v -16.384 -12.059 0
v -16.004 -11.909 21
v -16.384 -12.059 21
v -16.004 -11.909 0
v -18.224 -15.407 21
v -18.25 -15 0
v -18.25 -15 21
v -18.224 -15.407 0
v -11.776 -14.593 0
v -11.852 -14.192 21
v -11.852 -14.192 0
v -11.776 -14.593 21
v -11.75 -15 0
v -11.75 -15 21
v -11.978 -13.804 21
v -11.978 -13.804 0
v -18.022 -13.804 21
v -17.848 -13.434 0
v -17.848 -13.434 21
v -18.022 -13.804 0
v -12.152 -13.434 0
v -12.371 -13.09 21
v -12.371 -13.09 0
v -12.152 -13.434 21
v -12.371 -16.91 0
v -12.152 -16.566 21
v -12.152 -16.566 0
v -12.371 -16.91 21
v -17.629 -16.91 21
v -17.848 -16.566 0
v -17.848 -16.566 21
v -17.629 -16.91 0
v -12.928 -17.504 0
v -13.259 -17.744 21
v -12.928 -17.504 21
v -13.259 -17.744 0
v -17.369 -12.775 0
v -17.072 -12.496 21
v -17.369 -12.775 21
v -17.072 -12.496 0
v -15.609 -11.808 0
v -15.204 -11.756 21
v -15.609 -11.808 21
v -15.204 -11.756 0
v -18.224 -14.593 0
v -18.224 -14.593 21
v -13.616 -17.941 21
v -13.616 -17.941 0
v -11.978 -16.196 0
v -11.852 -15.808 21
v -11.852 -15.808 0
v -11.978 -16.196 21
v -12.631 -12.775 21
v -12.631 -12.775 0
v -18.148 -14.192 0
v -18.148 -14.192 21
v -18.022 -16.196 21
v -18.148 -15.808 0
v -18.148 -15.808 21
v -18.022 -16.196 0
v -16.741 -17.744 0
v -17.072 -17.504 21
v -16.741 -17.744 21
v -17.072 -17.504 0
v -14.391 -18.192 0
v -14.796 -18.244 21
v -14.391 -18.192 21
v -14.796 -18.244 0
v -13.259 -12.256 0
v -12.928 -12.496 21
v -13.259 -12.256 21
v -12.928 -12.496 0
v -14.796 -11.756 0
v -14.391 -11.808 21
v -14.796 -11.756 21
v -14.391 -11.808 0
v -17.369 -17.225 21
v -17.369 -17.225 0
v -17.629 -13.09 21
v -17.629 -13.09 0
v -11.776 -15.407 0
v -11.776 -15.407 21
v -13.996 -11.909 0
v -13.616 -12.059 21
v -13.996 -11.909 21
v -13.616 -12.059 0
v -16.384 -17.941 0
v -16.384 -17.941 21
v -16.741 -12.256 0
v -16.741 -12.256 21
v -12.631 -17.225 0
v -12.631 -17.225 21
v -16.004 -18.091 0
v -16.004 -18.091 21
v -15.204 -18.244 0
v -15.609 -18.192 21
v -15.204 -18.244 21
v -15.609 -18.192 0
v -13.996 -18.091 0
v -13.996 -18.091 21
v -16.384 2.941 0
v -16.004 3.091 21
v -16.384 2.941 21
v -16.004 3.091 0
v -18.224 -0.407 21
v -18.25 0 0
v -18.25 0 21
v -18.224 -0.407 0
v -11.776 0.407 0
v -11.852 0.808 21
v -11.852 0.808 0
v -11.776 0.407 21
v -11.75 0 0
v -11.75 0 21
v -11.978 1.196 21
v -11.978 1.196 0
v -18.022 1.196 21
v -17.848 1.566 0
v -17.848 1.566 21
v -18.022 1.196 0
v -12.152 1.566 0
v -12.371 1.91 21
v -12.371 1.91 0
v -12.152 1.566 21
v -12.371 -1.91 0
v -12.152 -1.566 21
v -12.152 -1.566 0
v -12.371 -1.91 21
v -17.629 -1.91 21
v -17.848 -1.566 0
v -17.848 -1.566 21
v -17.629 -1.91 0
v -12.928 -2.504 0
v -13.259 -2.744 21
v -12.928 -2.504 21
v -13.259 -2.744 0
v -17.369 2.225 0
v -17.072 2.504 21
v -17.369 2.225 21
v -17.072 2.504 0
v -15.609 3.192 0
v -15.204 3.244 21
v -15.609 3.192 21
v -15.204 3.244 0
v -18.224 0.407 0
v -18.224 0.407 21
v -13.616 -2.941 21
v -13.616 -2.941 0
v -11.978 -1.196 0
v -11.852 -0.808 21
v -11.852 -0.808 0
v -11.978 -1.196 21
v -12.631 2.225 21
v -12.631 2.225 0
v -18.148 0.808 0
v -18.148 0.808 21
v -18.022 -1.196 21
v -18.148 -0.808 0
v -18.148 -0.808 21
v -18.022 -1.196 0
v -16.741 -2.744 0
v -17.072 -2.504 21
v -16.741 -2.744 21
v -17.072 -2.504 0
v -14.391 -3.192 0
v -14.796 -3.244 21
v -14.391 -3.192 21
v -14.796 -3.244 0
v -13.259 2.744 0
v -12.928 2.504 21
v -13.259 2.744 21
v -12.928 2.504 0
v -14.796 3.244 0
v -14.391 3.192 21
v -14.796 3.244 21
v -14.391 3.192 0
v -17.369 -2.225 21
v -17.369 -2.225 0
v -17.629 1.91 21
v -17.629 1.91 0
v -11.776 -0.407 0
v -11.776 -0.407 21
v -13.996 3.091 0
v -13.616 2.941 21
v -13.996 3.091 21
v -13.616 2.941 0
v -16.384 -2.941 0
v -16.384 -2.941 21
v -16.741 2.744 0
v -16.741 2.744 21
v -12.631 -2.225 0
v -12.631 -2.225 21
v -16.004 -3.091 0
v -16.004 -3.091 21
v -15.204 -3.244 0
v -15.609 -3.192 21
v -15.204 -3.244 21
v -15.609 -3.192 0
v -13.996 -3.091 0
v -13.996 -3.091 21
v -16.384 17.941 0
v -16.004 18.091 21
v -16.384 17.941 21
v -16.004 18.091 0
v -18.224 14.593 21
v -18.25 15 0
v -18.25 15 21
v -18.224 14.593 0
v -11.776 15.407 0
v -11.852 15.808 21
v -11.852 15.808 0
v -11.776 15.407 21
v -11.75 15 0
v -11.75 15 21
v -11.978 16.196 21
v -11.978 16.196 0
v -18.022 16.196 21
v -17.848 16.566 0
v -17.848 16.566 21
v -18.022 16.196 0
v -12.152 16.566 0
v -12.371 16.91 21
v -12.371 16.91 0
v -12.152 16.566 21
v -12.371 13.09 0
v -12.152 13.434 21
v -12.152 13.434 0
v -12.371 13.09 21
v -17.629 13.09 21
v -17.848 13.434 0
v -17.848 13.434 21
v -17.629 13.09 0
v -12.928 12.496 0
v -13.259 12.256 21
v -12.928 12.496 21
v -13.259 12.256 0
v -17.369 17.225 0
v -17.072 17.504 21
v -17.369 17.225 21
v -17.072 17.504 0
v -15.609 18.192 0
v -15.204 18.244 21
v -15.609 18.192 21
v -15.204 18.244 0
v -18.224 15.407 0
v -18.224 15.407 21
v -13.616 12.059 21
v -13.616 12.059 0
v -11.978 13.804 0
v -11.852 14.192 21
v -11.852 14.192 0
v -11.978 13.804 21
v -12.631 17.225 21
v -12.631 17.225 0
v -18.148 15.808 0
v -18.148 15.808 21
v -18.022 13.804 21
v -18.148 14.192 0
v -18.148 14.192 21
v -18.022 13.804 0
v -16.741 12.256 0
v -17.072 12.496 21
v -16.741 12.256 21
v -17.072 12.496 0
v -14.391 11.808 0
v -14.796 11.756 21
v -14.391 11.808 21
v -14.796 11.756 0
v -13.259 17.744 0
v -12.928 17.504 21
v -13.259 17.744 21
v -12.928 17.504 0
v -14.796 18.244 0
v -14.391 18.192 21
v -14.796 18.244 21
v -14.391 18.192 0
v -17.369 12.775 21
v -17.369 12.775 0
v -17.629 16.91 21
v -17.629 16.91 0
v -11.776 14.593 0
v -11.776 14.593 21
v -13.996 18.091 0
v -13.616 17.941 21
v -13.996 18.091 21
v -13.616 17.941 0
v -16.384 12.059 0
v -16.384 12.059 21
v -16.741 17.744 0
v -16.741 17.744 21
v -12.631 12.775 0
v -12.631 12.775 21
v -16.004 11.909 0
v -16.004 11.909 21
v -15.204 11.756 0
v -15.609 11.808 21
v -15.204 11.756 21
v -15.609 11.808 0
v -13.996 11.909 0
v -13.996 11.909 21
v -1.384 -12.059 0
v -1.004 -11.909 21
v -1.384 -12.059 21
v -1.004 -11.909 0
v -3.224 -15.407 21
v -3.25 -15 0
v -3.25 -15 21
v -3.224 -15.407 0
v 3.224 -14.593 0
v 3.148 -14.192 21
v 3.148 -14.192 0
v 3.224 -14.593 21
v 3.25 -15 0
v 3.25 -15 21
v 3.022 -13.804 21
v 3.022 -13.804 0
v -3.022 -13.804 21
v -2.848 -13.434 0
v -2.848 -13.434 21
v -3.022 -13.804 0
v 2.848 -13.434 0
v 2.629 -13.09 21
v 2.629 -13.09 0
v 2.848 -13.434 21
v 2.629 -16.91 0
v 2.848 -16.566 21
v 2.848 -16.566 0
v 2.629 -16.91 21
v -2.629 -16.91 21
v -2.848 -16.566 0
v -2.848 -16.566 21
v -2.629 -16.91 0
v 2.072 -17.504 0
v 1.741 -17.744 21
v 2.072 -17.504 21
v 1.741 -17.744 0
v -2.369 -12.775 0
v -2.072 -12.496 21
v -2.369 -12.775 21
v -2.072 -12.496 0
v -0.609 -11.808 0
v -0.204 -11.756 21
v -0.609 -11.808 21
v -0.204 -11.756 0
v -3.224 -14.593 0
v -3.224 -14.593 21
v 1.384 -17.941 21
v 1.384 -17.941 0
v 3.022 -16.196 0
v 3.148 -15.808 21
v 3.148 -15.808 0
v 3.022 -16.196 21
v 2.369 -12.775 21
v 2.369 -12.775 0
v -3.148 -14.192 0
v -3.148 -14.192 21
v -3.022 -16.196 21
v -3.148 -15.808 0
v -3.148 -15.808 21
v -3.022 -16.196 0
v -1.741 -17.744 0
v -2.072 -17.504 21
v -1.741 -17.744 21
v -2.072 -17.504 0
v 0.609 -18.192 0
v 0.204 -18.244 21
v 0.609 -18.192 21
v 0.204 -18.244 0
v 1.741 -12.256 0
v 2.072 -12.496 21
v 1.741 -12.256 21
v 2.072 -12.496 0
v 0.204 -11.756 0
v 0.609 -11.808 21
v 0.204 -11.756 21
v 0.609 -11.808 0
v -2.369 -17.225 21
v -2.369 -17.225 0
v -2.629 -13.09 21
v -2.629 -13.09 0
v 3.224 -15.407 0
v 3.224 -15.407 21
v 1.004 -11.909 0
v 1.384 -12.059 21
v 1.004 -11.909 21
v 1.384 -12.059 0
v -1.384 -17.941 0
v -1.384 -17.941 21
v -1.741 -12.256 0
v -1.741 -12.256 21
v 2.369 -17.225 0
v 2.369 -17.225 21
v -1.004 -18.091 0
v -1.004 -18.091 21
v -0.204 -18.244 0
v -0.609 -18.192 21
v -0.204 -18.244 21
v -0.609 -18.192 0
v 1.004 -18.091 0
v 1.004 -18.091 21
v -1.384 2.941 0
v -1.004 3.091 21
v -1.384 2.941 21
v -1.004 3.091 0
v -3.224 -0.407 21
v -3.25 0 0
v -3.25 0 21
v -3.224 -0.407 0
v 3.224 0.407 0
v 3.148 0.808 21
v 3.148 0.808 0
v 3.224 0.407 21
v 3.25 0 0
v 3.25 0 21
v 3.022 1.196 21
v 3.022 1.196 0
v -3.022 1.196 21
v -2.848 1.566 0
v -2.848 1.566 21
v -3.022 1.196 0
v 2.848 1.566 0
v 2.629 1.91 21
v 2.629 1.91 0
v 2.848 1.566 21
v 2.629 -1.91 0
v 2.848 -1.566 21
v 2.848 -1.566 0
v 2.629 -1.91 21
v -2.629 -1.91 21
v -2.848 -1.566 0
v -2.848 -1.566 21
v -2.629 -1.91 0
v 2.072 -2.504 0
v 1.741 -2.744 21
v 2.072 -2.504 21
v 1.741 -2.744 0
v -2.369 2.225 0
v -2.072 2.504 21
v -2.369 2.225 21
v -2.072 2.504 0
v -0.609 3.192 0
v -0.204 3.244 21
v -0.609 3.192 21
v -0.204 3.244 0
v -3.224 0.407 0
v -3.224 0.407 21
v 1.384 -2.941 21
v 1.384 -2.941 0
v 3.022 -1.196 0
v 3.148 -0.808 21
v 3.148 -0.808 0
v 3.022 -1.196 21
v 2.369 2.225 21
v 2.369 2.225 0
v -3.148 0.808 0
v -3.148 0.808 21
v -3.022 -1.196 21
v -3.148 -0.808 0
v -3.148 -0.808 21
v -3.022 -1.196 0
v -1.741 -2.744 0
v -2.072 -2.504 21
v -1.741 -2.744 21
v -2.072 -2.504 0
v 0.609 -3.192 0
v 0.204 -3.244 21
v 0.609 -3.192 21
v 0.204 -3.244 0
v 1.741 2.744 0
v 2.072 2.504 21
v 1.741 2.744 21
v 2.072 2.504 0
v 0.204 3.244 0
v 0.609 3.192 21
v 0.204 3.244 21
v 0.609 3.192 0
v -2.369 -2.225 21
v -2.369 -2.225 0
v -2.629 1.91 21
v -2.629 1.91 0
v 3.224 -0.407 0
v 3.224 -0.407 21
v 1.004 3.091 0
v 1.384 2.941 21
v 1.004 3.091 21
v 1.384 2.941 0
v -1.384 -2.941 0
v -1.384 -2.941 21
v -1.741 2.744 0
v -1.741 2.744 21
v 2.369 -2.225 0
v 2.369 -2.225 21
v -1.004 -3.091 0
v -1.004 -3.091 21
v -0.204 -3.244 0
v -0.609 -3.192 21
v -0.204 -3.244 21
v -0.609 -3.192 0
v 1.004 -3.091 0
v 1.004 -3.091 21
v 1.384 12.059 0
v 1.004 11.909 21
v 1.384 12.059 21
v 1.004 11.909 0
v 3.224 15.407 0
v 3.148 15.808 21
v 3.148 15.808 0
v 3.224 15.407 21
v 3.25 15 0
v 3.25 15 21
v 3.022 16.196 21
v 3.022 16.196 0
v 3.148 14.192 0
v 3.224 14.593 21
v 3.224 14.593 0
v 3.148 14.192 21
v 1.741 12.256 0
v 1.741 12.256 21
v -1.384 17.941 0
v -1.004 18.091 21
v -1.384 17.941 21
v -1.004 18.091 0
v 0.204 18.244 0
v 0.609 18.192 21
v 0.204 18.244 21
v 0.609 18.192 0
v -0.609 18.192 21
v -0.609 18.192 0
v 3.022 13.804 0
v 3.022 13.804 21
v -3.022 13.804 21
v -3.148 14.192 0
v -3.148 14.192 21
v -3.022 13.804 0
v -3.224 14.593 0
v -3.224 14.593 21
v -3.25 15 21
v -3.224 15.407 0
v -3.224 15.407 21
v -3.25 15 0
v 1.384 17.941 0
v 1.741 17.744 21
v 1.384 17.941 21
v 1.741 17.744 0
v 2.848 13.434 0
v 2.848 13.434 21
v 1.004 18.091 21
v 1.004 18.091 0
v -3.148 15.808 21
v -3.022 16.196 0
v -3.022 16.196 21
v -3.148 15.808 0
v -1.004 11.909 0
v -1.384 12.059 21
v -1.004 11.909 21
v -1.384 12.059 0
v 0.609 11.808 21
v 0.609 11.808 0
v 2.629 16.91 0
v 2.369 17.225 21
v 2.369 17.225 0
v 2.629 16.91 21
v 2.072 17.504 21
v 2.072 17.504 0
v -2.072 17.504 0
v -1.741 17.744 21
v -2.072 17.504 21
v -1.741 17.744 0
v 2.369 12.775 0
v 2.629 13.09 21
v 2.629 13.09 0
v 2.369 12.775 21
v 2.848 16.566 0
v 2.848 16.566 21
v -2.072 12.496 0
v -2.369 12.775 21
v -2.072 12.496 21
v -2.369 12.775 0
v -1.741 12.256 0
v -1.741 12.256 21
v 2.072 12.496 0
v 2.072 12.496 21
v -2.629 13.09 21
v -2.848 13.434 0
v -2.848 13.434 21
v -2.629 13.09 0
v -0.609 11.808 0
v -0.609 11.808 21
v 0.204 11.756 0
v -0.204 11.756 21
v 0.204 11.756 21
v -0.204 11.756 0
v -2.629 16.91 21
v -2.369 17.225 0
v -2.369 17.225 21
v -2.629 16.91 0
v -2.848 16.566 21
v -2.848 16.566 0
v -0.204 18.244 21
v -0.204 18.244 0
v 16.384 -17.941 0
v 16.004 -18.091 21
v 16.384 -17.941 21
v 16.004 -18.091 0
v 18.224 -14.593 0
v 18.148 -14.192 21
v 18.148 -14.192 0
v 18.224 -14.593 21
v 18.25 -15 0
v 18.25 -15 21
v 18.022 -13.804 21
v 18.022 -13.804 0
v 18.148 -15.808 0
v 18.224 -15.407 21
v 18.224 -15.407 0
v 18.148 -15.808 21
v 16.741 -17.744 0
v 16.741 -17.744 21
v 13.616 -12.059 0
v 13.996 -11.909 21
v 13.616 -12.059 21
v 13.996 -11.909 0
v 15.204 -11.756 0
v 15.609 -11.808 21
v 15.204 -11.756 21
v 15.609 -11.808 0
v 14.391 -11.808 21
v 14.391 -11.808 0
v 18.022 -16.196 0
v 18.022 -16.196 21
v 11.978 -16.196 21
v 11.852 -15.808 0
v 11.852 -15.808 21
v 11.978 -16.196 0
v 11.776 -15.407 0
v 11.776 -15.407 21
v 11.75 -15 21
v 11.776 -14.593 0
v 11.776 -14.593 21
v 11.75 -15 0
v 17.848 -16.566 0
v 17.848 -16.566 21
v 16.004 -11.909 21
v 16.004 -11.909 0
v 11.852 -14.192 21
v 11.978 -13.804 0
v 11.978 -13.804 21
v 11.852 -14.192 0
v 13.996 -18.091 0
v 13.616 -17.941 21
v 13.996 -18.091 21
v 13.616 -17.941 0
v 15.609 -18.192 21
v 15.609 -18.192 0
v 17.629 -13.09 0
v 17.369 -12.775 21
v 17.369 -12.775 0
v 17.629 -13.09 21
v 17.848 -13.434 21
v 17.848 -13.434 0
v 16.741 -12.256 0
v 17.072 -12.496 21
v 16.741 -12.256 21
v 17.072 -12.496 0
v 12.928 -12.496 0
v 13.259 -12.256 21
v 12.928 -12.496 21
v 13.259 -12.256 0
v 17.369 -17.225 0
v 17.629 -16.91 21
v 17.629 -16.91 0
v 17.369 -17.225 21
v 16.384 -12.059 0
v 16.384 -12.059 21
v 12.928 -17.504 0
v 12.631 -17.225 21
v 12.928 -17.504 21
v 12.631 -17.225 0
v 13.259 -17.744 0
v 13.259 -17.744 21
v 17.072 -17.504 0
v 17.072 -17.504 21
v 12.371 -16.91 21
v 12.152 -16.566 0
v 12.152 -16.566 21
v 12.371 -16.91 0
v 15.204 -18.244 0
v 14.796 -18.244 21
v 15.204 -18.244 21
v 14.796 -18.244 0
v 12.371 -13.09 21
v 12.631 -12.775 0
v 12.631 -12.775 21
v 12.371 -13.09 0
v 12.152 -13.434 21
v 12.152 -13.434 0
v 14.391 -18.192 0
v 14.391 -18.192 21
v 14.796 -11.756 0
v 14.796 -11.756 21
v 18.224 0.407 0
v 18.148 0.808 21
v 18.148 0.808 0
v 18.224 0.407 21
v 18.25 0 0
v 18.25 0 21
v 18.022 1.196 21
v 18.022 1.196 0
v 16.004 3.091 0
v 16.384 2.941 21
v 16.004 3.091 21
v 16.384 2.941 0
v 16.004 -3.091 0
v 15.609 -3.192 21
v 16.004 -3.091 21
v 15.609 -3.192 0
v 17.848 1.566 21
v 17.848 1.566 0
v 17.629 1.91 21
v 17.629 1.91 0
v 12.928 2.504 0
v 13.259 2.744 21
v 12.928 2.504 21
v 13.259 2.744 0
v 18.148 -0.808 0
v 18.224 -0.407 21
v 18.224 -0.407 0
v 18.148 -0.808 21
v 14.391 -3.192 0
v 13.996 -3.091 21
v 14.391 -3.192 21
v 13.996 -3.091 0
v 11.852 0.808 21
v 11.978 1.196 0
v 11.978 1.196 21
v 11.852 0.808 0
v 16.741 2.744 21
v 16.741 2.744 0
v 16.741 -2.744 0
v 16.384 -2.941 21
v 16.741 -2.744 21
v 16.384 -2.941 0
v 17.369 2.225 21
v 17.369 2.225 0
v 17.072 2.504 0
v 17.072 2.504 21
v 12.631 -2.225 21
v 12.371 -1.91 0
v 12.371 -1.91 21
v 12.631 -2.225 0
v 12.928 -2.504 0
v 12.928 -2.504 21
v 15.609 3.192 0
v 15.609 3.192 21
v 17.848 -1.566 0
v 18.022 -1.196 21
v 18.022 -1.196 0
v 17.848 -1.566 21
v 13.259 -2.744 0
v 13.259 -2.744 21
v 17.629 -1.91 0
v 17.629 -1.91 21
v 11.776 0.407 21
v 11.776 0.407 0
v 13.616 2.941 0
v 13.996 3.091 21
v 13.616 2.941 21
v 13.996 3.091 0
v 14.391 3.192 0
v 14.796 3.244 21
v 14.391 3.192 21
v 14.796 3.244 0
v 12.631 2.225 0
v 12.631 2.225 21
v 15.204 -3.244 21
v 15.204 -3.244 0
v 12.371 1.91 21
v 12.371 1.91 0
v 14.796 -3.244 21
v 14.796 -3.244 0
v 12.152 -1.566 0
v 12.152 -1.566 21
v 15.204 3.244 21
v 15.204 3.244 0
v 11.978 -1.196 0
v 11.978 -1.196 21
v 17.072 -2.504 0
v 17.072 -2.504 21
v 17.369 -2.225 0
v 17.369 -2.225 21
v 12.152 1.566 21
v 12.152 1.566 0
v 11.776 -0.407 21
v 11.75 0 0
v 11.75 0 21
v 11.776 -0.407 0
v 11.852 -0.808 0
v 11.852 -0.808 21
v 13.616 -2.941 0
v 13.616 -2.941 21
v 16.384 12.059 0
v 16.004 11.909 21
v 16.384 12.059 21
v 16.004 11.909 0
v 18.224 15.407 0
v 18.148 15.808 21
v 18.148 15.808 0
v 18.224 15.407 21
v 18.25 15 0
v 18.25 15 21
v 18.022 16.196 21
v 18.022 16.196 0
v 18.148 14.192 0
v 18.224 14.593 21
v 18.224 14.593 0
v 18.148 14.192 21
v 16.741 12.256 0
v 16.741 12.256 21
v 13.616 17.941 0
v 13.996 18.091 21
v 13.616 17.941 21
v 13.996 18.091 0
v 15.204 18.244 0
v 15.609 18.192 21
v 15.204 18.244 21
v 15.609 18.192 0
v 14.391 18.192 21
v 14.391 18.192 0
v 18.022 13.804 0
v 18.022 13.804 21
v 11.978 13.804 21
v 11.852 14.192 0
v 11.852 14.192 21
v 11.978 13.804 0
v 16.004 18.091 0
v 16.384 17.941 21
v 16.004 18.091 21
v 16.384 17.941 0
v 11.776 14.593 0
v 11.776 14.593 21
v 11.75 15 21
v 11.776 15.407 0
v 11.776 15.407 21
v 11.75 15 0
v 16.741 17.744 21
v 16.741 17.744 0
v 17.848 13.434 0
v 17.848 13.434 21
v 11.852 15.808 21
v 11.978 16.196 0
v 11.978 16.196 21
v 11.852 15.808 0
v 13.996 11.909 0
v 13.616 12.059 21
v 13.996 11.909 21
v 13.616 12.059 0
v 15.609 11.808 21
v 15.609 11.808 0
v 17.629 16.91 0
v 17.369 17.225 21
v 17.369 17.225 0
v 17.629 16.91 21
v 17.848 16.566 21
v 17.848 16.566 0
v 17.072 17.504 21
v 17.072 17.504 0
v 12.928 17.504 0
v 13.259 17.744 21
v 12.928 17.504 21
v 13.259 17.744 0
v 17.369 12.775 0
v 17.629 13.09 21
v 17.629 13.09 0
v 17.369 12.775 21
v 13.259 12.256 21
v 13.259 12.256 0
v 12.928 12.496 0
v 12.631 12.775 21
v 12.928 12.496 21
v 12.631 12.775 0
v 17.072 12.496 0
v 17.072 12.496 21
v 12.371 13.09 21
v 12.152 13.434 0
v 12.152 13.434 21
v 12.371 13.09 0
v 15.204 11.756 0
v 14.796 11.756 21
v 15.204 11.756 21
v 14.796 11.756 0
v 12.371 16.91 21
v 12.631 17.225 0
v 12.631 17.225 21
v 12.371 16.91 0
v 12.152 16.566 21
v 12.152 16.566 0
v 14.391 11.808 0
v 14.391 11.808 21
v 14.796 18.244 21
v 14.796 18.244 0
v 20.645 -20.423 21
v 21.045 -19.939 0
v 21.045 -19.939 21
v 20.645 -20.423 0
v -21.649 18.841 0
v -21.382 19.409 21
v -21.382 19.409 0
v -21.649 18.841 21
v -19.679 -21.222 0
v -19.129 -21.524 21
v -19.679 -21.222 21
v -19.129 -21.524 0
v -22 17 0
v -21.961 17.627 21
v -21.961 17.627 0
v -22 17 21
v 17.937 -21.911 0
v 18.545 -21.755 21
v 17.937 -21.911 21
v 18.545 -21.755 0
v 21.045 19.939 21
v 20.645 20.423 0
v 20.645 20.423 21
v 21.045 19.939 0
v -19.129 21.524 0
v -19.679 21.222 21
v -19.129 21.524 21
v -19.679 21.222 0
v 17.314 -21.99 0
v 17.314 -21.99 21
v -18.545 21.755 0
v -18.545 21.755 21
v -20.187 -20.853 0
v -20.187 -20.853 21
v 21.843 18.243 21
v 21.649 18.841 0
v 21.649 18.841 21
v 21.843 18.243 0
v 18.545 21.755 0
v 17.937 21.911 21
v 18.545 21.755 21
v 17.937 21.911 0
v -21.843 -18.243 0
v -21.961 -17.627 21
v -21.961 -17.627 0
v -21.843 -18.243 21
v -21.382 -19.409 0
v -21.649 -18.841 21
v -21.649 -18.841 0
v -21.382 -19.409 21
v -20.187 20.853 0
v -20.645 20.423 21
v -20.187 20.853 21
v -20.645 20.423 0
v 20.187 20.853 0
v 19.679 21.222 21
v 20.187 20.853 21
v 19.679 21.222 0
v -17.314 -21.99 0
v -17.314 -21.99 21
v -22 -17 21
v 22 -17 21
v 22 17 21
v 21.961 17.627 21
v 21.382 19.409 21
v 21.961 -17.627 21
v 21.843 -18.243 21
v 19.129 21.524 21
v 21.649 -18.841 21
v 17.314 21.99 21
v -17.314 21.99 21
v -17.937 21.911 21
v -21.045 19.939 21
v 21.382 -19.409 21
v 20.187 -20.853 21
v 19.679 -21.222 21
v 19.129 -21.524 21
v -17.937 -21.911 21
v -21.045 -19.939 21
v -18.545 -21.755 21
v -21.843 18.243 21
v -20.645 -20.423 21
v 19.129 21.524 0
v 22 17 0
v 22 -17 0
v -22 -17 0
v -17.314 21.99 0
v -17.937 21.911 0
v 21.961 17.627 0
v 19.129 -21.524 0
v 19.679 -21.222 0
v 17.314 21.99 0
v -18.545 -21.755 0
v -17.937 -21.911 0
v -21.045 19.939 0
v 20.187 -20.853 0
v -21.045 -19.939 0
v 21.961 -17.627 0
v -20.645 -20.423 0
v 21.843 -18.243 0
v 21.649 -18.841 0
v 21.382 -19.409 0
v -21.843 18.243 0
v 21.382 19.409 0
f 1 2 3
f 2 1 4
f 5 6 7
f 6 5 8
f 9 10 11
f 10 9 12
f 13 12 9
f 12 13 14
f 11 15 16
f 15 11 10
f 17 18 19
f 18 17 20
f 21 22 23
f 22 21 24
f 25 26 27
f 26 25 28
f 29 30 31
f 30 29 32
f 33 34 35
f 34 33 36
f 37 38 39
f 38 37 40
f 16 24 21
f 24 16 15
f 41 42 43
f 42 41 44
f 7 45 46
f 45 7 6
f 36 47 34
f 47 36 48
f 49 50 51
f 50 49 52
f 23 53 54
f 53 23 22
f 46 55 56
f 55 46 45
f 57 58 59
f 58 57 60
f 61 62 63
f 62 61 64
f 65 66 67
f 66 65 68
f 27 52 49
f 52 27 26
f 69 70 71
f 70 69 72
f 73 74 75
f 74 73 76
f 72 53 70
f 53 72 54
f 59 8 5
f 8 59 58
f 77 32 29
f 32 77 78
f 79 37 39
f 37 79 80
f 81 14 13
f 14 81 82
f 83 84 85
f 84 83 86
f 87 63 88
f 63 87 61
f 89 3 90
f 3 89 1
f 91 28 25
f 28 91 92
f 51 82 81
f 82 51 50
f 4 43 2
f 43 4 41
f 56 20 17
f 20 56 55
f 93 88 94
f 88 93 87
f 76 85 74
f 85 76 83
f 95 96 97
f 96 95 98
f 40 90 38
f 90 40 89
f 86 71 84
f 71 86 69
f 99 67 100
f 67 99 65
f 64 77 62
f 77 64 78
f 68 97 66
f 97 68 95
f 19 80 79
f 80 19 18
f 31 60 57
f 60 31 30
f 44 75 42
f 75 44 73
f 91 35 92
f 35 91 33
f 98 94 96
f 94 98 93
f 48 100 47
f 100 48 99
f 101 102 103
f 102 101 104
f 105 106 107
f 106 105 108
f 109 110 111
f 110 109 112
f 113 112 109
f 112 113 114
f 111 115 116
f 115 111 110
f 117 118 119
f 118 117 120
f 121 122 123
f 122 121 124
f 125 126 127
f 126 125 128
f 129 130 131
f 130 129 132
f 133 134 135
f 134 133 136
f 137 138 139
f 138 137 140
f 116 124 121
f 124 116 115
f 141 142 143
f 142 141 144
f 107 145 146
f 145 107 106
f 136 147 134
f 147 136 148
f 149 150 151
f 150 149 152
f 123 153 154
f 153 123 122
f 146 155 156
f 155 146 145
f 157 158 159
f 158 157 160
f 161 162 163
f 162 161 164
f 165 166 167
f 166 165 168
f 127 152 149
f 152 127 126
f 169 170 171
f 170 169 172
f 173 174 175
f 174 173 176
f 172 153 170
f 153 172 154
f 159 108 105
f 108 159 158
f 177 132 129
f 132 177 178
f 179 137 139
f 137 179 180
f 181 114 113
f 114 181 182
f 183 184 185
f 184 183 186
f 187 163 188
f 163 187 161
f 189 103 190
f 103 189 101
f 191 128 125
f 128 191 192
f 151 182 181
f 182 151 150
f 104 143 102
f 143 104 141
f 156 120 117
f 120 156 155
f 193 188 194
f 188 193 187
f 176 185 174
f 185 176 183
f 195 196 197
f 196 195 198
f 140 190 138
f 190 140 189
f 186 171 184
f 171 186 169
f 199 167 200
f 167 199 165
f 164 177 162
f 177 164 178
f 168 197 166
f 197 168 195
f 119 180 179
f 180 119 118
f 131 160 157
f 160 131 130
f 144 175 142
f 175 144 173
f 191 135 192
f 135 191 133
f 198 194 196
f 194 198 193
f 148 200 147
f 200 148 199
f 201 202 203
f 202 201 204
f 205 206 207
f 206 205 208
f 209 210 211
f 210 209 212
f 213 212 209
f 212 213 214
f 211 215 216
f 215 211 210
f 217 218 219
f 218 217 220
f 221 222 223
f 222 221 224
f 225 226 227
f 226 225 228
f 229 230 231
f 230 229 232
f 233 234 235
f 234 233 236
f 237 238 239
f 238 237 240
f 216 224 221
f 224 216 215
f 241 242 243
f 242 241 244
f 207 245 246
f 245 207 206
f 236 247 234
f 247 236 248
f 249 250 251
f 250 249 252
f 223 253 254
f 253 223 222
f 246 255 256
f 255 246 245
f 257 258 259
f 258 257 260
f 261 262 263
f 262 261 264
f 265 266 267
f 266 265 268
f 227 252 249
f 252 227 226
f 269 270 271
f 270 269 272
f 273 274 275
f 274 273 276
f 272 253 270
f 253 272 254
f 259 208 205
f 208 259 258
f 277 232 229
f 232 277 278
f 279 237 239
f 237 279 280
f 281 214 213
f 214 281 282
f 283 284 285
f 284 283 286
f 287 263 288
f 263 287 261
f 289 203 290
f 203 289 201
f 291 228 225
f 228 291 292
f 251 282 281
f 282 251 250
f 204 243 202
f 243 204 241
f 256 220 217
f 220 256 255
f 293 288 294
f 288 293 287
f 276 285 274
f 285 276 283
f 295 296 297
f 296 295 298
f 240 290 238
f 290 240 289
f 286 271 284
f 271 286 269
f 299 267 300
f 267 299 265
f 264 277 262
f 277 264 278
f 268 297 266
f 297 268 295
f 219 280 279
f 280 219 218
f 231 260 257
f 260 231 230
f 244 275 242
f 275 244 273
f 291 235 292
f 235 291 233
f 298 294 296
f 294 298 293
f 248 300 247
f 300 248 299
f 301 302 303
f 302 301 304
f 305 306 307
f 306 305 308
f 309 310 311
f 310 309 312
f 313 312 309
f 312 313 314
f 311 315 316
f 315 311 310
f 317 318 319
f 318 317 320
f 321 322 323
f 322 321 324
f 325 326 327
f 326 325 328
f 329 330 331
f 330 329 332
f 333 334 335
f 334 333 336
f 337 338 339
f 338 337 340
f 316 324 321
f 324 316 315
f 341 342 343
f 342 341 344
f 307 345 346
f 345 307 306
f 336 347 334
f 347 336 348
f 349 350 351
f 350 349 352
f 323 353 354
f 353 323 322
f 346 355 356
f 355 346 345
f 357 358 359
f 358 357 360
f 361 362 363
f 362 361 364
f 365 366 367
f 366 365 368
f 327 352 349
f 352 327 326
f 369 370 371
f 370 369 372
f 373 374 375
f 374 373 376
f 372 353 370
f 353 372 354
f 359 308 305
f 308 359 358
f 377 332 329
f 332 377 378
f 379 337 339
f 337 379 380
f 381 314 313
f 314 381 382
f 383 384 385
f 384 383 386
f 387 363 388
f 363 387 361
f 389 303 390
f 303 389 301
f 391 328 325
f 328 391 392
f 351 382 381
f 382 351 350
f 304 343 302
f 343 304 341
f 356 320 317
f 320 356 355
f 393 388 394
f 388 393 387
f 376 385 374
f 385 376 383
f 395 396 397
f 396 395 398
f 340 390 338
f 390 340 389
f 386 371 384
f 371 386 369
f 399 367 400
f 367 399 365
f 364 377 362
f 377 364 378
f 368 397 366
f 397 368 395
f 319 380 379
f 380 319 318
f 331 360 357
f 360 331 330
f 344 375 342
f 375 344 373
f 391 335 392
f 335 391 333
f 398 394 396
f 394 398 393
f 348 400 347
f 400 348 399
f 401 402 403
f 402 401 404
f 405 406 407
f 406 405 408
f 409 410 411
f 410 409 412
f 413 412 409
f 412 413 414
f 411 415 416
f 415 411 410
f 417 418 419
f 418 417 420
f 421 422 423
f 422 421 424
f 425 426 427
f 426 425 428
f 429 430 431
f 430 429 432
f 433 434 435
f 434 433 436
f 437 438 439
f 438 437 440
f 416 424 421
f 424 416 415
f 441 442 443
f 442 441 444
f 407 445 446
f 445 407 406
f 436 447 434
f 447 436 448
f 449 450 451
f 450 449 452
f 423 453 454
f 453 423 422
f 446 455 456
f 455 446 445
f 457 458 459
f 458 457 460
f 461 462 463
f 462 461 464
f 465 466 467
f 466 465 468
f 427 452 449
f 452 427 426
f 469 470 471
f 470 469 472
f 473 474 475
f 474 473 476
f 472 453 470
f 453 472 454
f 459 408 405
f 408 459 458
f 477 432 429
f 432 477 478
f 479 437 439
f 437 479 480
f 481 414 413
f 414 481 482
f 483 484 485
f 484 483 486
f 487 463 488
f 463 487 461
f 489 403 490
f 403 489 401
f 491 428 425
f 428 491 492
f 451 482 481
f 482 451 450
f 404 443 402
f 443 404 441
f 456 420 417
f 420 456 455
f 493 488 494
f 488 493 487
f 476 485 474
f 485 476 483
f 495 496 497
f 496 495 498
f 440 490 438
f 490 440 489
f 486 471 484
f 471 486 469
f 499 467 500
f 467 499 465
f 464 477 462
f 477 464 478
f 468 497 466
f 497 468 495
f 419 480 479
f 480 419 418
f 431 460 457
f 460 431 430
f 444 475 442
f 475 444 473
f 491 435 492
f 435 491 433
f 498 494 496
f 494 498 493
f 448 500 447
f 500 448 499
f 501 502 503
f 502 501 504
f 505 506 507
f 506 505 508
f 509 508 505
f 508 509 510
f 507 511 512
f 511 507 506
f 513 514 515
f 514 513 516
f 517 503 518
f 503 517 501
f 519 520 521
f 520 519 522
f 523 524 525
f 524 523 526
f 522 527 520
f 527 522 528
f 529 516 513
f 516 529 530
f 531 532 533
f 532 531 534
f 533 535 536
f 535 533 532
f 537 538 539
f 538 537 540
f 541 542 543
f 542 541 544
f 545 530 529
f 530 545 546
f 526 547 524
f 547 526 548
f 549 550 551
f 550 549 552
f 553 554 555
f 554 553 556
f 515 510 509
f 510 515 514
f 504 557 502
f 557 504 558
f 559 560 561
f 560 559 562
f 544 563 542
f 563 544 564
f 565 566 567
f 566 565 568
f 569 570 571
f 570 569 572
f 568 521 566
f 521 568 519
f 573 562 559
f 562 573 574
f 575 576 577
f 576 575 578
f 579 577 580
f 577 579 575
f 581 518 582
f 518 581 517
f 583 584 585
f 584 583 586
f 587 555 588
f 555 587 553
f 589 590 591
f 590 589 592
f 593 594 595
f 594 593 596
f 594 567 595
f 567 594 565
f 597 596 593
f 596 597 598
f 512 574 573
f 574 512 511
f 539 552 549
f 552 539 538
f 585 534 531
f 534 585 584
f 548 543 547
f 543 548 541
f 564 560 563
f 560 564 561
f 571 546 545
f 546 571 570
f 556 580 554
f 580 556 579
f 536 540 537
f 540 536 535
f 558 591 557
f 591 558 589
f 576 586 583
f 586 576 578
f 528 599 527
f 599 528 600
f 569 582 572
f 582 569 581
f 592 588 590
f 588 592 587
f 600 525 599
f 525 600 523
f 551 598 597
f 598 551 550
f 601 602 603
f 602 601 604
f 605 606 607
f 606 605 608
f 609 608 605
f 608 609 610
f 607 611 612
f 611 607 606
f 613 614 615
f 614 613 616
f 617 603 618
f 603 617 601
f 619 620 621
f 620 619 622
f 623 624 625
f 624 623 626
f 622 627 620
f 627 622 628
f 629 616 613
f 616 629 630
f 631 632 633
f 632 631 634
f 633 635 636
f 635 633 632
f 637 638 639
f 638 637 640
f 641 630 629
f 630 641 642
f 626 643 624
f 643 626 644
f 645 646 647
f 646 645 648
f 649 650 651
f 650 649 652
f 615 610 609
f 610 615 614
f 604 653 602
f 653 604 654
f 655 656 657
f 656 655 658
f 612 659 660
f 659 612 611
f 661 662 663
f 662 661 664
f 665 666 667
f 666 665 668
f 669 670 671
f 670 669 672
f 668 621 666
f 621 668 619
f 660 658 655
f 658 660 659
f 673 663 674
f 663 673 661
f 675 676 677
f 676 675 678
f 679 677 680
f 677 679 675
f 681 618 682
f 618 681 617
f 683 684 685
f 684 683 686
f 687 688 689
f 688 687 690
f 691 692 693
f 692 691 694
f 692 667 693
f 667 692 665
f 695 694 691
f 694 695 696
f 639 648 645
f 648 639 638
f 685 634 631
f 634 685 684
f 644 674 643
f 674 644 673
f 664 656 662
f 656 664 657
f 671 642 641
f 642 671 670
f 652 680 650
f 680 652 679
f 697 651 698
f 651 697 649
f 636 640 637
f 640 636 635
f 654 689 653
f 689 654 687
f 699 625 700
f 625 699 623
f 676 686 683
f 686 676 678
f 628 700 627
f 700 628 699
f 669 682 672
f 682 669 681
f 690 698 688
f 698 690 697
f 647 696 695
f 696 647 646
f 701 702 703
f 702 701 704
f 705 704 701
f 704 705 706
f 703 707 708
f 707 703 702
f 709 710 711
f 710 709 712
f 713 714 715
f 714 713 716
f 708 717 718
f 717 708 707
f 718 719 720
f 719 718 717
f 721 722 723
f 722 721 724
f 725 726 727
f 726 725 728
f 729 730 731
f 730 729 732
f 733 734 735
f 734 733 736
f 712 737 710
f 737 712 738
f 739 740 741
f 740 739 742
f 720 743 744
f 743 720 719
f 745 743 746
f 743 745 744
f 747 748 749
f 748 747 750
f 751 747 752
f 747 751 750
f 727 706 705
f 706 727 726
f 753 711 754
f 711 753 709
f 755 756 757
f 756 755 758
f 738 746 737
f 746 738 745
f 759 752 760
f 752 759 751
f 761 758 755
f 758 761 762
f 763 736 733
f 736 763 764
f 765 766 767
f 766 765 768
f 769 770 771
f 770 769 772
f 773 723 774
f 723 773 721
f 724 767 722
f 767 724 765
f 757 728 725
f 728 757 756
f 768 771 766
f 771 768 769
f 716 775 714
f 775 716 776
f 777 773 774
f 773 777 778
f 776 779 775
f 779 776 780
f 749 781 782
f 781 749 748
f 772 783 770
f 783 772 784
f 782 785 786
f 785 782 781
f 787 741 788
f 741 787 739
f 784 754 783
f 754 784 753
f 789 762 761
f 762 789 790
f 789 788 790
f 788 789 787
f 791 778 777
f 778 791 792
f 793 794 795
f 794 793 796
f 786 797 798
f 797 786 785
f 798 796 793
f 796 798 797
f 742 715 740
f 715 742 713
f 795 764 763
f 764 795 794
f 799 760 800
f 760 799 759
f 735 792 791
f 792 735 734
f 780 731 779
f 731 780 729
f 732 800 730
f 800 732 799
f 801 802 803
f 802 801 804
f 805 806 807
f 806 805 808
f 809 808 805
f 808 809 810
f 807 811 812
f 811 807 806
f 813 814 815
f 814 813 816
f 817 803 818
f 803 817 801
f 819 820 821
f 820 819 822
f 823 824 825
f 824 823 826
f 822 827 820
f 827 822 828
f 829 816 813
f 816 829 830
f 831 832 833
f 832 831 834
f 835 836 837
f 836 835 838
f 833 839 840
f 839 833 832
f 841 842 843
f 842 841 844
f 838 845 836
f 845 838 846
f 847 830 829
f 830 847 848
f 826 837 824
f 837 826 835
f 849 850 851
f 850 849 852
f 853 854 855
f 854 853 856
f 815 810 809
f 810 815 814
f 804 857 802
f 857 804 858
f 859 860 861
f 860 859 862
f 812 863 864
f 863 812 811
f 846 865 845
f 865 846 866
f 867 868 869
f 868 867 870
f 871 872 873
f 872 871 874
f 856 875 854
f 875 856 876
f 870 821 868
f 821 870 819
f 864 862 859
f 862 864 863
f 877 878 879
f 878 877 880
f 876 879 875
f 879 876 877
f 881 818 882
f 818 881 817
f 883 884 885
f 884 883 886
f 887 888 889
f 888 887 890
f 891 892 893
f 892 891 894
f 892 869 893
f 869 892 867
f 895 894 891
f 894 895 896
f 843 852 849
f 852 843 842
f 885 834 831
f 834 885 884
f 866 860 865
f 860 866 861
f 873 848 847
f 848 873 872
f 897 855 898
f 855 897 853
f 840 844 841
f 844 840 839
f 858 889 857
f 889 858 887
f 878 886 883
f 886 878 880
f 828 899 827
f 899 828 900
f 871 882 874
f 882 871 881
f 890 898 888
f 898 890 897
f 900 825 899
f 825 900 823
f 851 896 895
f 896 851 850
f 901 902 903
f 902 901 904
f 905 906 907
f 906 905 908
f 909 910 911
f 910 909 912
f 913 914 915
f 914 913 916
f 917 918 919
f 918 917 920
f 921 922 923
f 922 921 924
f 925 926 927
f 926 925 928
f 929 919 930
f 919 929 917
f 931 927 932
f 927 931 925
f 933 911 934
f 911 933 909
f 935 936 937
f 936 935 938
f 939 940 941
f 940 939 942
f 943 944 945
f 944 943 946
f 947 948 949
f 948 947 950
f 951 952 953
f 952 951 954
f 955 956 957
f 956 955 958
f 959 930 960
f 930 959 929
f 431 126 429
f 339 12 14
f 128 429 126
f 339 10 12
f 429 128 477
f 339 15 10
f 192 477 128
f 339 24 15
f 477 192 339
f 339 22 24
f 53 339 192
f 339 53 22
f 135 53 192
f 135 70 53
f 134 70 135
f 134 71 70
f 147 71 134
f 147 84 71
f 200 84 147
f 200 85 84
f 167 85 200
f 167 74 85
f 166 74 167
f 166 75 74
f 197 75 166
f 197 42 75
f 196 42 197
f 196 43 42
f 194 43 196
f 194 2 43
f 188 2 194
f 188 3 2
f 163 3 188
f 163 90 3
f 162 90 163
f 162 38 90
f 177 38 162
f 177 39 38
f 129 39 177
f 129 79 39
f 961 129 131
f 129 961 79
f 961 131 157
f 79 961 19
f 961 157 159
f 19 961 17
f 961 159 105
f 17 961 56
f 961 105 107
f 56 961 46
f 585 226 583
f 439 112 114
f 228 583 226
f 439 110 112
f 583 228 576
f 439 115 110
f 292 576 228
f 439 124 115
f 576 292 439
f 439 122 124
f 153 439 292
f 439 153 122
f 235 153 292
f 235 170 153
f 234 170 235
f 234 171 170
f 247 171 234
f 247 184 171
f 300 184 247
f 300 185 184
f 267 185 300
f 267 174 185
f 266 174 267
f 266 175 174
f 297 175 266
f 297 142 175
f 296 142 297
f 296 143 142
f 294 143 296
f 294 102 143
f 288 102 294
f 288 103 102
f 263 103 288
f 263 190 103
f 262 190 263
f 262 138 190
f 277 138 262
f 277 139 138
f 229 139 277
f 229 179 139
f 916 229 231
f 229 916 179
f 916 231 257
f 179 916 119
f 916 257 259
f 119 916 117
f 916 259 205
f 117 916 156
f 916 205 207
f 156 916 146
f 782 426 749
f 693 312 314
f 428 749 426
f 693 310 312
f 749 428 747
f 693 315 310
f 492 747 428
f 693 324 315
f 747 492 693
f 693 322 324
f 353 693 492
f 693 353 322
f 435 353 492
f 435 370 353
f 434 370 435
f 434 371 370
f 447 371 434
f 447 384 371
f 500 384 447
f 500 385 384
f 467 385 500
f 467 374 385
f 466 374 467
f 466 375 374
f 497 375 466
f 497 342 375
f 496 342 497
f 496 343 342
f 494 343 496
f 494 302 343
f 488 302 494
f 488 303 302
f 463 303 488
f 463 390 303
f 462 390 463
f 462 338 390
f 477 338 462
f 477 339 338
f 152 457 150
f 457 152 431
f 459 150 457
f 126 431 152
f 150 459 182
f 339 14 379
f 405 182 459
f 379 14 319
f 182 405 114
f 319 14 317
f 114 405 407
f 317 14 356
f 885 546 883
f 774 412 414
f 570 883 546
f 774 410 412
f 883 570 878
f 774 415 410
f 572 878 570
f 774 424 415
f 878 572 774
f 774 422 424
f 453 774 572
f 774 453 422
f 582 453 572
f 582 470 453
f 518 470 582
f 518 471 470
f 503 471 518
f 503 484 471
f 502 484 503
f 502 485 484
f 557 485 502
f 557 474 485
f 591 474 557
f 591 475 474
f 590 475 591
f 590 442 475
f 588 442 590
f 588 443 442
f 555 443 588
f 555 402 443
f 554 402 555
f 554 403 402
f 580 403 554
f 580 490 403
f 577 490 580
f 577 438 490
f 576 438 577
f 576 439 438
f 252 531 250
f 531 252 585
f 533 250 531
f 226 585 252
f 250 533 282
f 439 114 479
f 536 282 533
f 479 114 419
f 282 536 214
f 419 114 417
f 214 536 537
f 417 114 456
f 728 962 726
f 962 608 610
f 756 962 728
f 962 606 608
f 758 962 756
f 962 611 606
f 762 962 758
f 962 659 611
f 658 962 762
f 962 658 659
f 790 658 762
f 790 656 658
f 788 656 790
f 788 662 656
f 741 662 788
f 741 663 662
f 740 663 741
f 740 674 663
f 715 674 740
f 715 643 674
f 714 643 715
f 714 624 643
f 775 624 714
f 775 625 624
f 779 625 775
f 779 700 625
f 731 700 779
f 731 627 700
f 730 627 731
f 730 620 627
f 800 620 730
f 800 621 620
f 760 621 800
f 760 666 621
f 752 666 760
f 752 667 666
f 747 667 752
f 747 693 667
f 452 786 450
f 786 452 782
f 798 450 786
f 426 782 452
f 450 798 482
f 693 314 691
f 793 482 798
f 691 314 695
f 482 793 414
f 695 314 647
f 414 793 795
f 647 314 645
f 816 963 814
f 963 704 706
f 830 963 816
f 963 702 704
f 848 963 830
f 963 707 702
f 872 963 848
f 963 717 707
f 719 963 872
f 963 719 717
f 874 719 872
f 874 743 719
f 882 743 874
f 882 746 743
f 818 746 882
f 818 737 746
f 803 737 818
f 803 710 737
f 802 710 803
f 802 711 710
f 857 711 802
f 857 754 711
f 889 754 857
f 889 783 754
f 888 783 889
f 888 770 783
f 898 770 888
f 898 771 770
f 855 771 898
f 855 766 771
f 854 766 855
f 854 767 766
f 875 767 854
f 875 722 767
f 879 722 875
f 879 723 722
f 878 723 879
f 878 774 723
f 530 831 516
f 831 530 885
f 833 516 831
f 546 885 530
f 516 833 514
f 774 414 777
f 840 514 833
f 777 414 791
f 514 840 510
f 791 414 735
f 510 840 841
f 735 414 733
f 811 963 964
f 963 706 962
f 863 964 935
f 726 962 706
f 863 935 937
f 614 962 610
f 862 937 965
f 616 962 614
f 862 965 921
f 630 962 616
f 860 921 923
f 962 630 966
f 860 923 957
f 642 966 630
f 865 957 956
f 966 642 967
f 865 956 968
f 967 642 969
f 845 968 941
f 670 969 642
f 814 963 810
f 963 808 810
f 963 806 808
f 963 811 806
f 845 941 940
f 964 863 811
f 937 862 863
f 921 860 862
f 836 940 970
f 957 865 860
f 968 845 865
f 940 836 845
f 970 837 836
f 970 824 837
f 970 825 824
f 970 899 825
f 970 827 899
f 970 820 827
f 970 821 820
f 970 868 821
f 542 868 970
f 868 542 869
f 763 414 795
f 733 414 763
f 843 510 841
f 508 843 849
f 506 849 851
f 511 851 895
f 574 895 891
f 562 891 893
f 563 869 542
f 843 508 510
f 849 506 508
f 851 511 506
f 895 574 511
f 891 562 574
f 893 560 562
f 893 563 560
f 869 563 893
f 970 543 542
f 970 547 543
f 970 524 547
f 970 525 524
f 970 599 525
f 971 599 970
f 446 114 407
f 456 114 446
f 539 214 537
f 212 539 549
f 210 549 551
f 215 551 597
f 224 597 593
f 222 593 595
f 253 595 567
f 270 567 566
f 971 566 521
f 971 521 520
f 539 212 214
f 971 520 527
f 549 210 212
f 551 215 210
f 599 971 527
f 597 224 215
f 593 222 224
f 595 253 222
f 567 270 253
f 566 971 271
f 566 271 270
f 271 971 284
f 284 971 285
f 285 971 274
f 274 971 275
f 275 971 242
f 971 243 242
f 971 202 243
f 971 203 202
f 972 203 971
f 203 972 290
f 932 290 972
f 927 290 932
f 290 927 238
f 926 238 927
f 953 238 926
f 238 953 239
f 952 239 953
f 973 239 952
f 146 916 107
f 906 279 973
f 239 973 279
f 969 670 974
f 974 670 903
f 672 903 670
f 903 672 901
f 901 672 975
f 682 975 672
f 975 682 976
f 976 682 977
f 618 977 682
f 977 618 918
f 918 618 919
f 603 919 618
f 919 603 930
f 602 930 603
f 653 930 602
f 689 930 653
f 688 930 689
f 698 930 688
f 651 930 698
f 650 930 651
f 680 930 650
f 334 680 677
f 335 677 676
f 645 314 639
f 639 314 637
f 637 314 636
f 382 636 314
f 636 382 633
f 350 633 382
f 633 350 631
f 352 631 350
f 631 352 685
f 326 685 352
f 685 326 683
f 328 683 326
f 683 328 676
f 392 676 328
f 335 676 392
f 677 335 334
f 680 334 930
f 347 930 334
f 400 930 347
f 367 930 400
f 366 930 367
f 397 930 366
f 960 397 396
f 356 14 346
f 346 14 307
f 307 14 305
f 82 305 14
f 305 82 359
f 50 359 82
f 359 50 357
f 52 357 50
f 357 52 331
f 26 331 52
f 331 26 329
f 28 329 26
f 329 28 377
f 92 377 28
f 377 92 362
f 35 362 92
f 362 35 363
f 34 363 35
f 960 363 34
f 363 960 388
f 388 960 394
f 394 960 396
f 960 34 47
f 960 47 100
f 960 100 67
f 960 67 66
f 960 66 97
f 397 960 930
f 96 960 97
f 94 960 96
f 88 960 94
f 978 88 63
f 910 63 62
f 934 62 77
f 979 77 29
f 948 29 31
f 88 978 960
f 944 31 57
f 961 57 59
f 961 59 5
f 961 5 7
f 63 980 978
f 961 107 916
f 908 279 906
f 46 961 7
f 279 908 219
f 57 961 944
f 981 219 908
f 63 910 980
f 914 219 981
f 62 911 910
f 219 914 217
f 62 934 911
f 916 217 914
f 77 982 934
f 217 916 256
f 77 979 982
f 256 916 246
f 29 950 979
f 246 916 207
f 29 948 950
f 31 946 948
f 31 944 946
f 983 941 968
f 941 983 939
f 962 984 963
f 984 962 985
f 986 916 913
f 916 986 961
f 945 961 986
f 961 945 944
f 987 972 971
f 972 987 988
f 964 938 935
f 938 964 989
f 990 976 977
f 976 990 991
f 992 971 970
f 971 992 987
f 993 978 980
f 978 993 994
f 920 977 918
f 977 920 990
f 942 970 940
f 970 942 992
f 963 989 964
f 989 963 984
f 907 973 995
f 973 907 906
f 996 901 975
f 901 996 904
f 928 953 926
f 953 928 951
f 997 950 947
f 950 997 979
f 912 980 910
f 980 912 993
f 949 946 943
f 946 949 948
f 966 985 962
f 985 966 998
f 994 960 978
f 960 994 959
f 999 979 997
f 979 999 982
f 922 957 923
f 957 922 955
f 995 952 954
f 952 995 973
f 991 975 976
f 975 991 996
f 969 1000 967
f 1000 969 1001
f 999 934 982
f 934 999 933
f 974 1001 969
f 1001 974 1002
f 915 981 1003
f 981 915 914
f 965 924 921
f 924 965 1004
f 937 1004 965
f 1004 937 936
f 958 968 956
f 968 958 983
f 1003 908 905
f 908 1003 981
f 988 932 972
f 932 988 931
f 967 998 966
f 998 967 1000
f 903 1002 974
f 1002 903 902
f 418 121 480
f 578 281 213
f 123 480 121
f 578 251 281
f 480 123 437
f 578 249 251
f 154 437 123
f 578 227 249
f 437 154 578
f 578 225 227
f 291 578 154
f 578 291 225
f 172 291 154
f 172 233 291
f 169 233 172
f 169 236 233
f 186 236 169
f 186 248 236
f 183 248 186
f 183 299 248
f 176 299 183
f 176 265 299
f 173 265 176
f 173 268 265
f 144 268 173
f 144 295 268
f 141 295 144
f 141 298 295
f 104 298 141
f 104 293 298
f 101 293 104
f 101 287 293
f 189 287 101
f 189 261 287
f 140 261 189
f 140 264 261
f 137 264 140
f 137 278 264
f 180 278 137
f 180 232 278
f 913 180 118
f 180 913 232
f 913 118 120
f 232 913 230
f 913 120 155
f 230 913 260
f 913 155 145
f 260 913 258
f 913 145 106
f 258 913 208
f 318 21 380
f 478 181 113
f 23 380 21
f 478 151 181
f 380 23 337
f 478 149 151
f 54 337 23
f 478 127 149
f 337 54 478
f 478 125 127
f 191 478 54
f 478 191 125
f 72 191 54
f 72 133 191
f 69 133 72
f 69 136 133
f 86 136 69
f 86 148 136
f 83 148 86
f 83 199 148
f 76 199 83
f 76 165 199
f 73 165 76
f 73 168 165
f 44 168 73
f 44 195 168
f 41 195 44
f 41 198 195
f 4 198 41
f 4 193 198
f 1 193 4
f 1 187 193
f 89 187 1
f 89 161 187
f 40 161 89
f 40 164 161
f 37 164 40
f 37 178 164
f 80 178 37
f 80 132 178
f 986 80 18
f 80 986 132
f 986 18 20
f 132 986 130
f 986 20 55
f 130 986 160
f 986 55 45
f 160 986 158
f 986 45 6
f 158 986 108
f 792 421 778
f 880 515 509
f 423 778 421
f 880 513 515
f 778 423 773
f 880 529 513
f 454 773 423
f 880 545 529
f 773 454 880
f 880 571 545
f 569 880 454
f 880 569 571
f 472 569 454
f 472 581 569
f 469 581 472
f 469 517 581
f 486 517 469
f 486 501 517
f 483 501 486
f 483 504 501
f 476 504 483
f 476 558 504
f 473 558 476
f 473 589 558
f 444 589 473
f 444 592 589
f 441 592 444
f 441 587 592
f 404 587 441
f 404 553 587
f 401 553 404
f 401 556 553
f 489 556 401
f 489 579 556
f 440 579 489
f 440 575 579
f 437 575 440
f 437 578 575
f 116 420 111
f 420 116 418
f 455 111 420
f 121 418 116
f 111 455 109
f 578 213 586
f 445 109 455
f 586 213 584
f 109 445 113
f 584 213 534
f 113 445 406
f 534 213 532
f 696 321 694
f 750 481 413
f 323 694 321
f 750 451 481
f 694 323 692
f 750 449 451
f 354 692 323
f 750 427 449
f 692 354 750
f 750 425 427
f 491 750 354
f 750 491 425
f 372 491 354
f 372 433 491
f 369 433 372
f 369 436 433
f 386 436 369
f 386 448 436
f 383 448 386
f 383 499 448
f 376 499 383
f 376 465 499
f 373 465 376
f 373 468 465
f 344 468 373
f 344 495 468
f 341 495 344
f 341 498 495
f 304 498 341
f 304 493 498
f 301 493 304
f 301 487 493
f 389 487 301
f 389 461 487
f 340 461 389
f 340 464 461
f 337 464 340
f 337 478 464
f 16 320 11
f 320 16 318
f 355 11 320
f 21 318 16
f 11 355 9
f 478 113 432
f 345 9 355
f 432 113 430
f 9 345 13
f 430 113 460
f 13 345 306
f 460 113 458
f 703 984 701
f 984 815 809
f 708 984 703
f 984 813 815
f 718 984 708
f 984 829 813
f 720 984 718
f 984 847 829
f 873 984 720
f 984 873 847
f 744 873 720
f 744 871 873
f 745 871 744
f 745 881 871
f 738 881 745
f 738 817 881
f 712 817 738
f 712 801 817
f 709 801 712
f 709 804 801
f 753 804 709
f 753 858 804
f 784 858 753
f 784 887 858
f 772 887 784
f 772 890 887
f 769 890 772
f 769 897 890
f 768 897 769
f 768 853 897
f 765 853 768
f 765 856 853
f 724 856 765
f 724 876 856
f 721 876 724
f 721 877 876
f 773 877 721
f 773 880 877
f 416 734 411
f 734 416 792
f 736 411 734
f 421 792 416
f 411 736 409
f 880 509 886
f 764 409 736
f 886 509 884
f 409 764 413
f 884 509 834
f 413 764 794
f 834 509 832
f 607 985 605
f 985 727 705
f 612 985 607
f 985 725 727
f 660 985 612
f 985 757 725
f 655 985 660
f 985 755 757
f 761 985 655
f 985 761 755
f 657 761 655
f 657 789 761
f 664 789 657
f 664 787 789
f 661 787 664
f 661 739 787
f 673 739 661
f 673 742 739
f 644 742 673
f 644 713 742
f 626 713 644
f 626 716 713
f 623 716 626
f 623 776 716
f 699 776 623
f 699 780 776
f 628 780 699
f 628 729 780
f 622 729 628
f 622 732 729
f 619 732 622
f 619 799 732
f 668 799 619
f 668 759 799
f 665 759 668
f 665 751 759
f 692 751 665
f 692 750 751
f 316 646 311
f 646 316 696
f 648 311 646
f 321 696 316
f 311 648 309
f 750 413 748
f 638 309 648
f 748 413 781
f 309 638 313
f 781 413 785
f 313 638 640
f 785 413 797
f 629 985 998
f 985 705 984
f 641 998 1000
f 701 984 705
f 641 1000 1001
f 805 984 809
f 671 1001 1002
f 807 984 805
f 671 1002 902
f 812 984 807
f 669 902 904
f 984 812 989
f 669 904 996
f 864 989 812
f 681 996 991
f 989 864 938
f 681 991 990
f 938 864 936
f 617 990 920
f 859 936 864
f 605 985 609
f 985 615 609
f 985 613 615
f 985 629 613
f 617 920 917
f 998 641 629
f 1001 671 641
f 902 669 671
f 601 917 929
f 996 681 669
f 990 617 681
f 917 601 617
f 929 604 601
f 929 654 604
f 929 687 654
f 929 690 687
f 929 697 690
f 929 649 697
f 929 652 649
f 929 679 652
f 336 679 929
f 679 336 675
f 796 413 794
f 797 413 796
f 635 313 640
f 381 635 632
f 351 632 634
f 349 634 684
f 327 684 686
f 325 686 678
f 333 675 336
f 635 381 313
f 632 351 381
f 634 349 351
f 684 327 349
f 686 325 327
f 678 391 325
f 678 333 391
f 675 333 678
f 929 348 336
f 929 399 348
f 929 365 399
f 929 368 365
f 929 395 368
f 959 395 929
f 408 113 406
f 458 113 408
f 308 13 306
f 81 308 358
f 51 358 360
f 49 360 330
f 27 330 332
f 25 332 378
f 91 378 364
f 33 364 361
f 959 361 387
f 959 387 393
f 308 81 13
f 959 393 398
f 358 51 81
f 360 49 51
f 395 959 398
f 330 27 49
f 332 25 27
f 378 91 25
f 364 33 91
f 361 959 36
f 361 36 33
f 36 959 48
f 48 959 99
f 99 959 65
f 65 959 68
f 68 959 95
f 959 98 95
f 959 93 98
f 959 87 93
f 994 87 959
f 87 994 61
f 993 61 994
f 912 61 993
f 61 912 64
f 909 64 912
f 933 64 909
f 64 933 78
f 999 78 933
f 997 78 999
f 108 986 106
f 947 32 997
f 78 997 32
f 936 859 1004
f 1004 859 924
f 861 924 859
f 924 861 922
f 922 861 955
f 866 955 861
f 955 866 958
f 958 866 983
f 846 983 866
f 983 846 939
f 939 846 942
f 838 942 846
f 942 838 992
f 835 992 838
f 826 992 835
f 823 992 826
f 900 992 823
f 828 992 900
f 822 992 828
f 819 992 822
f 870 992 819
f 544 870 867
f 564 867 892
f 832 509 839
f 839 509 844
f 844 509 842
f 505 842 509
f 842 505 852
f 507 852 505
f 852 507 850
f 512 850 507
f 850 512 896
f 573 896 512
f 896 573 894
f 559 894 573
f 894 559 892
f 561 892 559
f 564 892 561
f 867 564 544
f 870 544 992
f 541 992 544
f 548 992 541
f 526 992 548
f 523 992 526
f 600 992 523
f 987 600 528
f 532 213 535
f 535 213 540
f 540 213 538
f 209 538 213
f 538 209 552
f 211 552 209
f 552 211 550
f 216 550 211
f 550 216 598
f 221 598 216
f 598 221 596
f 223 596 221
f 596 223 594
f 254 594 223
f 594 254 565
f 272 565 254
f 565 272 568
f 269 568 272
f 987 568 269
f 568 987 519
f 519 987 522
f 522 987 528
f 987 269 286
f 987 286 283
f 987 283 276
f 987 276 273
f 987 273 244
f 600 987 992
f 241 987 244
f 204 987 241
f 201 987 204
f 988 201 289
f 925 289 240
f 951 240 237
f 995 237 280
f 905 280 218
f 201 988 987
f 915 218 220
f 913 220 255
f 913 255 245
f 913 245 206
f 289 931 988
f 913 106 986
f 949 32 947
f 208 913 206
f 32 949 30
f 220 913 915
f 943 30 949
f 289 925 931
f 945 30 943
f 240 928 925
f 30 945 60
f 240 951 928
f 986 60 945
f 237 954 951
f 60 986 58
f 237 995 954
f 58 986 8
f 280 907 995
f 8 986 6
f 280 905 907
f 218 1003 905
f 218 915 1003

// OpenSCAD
$fn = 50;


difference() {
	union() {
		hull() {
			translate(v = [-17.0000000000, 17.0000000000, 0]) {
				cylinder(h = 21, r = 5);
			}
			translate(v = [17.0000000000, 17.0000000000, 0]) {
				cylinder(h = 21, r = 5);
			}
			translate(v = [-17.0000000000, -17.0000000000, 0]) {
				cylinder(h = 21, r = 5);
			}
			translate(v = [17.0000000000, -17.0000000000, 0]) {
				cylinder(h = 21, r = 5);
			}
		}
	}
	union() {
		translate(v = [-15.0000000000, -15.0000000000, 0]) {
			translate(v = [0, 0, -100]) {
				cylinder(h = 200, r = 3.2500000000);
			}
		}
		translate(v = [-15.0000000000, 0.0000000000, 0]) {
			translate(v = [0, 0, -100]) {
				cylinder(h = 200, r = 3.2500000000);
			}
		}
		translate(v = [-15.0000000000, 15.0000000000, 0]) {
			translate(v = [0, 0, -100]) {
				cylinder(h = 200, r = 3.2500000000);
			}
		}
		translate(v = [0.0000000000, -15.0000000000, 0]) {
			translate(v = [0, 0, -100]) {
				cylinder(h = 200, r = 3.2500000000);
			}
		}
		translate(v = [0, 0, -100]) {
			cylinder(h = 200, r = 3.2500000000);
		}
		translate(v = [0.0000000000, 15.0000000000, 0]) {
			translate(v = [0, 0, -100]) {
				cylinder(h = 200, r = 3.2500000000);
			}
		}
		translate(v = [15.0000000000, -15.0000000000, 0]) {
			translate(v = [0, 0, -100]) {
				cylinder(h = 200, r = 3.2500000000);
			}
		}
		translate(v = [15.0000000000, 0.0000000000, 0]) {
			translate(v = [0, 0, -100]) {
				cylinder(h = 200, r = 3.2500000000);
			}
		}
		translate(v = [15.0000000000, 15.0000000000, 0]) {
			translate(v = [0, 0, -100]) {
				cylinder(h = 200, r = 3.2500000000);
			}
		}
	}
}
